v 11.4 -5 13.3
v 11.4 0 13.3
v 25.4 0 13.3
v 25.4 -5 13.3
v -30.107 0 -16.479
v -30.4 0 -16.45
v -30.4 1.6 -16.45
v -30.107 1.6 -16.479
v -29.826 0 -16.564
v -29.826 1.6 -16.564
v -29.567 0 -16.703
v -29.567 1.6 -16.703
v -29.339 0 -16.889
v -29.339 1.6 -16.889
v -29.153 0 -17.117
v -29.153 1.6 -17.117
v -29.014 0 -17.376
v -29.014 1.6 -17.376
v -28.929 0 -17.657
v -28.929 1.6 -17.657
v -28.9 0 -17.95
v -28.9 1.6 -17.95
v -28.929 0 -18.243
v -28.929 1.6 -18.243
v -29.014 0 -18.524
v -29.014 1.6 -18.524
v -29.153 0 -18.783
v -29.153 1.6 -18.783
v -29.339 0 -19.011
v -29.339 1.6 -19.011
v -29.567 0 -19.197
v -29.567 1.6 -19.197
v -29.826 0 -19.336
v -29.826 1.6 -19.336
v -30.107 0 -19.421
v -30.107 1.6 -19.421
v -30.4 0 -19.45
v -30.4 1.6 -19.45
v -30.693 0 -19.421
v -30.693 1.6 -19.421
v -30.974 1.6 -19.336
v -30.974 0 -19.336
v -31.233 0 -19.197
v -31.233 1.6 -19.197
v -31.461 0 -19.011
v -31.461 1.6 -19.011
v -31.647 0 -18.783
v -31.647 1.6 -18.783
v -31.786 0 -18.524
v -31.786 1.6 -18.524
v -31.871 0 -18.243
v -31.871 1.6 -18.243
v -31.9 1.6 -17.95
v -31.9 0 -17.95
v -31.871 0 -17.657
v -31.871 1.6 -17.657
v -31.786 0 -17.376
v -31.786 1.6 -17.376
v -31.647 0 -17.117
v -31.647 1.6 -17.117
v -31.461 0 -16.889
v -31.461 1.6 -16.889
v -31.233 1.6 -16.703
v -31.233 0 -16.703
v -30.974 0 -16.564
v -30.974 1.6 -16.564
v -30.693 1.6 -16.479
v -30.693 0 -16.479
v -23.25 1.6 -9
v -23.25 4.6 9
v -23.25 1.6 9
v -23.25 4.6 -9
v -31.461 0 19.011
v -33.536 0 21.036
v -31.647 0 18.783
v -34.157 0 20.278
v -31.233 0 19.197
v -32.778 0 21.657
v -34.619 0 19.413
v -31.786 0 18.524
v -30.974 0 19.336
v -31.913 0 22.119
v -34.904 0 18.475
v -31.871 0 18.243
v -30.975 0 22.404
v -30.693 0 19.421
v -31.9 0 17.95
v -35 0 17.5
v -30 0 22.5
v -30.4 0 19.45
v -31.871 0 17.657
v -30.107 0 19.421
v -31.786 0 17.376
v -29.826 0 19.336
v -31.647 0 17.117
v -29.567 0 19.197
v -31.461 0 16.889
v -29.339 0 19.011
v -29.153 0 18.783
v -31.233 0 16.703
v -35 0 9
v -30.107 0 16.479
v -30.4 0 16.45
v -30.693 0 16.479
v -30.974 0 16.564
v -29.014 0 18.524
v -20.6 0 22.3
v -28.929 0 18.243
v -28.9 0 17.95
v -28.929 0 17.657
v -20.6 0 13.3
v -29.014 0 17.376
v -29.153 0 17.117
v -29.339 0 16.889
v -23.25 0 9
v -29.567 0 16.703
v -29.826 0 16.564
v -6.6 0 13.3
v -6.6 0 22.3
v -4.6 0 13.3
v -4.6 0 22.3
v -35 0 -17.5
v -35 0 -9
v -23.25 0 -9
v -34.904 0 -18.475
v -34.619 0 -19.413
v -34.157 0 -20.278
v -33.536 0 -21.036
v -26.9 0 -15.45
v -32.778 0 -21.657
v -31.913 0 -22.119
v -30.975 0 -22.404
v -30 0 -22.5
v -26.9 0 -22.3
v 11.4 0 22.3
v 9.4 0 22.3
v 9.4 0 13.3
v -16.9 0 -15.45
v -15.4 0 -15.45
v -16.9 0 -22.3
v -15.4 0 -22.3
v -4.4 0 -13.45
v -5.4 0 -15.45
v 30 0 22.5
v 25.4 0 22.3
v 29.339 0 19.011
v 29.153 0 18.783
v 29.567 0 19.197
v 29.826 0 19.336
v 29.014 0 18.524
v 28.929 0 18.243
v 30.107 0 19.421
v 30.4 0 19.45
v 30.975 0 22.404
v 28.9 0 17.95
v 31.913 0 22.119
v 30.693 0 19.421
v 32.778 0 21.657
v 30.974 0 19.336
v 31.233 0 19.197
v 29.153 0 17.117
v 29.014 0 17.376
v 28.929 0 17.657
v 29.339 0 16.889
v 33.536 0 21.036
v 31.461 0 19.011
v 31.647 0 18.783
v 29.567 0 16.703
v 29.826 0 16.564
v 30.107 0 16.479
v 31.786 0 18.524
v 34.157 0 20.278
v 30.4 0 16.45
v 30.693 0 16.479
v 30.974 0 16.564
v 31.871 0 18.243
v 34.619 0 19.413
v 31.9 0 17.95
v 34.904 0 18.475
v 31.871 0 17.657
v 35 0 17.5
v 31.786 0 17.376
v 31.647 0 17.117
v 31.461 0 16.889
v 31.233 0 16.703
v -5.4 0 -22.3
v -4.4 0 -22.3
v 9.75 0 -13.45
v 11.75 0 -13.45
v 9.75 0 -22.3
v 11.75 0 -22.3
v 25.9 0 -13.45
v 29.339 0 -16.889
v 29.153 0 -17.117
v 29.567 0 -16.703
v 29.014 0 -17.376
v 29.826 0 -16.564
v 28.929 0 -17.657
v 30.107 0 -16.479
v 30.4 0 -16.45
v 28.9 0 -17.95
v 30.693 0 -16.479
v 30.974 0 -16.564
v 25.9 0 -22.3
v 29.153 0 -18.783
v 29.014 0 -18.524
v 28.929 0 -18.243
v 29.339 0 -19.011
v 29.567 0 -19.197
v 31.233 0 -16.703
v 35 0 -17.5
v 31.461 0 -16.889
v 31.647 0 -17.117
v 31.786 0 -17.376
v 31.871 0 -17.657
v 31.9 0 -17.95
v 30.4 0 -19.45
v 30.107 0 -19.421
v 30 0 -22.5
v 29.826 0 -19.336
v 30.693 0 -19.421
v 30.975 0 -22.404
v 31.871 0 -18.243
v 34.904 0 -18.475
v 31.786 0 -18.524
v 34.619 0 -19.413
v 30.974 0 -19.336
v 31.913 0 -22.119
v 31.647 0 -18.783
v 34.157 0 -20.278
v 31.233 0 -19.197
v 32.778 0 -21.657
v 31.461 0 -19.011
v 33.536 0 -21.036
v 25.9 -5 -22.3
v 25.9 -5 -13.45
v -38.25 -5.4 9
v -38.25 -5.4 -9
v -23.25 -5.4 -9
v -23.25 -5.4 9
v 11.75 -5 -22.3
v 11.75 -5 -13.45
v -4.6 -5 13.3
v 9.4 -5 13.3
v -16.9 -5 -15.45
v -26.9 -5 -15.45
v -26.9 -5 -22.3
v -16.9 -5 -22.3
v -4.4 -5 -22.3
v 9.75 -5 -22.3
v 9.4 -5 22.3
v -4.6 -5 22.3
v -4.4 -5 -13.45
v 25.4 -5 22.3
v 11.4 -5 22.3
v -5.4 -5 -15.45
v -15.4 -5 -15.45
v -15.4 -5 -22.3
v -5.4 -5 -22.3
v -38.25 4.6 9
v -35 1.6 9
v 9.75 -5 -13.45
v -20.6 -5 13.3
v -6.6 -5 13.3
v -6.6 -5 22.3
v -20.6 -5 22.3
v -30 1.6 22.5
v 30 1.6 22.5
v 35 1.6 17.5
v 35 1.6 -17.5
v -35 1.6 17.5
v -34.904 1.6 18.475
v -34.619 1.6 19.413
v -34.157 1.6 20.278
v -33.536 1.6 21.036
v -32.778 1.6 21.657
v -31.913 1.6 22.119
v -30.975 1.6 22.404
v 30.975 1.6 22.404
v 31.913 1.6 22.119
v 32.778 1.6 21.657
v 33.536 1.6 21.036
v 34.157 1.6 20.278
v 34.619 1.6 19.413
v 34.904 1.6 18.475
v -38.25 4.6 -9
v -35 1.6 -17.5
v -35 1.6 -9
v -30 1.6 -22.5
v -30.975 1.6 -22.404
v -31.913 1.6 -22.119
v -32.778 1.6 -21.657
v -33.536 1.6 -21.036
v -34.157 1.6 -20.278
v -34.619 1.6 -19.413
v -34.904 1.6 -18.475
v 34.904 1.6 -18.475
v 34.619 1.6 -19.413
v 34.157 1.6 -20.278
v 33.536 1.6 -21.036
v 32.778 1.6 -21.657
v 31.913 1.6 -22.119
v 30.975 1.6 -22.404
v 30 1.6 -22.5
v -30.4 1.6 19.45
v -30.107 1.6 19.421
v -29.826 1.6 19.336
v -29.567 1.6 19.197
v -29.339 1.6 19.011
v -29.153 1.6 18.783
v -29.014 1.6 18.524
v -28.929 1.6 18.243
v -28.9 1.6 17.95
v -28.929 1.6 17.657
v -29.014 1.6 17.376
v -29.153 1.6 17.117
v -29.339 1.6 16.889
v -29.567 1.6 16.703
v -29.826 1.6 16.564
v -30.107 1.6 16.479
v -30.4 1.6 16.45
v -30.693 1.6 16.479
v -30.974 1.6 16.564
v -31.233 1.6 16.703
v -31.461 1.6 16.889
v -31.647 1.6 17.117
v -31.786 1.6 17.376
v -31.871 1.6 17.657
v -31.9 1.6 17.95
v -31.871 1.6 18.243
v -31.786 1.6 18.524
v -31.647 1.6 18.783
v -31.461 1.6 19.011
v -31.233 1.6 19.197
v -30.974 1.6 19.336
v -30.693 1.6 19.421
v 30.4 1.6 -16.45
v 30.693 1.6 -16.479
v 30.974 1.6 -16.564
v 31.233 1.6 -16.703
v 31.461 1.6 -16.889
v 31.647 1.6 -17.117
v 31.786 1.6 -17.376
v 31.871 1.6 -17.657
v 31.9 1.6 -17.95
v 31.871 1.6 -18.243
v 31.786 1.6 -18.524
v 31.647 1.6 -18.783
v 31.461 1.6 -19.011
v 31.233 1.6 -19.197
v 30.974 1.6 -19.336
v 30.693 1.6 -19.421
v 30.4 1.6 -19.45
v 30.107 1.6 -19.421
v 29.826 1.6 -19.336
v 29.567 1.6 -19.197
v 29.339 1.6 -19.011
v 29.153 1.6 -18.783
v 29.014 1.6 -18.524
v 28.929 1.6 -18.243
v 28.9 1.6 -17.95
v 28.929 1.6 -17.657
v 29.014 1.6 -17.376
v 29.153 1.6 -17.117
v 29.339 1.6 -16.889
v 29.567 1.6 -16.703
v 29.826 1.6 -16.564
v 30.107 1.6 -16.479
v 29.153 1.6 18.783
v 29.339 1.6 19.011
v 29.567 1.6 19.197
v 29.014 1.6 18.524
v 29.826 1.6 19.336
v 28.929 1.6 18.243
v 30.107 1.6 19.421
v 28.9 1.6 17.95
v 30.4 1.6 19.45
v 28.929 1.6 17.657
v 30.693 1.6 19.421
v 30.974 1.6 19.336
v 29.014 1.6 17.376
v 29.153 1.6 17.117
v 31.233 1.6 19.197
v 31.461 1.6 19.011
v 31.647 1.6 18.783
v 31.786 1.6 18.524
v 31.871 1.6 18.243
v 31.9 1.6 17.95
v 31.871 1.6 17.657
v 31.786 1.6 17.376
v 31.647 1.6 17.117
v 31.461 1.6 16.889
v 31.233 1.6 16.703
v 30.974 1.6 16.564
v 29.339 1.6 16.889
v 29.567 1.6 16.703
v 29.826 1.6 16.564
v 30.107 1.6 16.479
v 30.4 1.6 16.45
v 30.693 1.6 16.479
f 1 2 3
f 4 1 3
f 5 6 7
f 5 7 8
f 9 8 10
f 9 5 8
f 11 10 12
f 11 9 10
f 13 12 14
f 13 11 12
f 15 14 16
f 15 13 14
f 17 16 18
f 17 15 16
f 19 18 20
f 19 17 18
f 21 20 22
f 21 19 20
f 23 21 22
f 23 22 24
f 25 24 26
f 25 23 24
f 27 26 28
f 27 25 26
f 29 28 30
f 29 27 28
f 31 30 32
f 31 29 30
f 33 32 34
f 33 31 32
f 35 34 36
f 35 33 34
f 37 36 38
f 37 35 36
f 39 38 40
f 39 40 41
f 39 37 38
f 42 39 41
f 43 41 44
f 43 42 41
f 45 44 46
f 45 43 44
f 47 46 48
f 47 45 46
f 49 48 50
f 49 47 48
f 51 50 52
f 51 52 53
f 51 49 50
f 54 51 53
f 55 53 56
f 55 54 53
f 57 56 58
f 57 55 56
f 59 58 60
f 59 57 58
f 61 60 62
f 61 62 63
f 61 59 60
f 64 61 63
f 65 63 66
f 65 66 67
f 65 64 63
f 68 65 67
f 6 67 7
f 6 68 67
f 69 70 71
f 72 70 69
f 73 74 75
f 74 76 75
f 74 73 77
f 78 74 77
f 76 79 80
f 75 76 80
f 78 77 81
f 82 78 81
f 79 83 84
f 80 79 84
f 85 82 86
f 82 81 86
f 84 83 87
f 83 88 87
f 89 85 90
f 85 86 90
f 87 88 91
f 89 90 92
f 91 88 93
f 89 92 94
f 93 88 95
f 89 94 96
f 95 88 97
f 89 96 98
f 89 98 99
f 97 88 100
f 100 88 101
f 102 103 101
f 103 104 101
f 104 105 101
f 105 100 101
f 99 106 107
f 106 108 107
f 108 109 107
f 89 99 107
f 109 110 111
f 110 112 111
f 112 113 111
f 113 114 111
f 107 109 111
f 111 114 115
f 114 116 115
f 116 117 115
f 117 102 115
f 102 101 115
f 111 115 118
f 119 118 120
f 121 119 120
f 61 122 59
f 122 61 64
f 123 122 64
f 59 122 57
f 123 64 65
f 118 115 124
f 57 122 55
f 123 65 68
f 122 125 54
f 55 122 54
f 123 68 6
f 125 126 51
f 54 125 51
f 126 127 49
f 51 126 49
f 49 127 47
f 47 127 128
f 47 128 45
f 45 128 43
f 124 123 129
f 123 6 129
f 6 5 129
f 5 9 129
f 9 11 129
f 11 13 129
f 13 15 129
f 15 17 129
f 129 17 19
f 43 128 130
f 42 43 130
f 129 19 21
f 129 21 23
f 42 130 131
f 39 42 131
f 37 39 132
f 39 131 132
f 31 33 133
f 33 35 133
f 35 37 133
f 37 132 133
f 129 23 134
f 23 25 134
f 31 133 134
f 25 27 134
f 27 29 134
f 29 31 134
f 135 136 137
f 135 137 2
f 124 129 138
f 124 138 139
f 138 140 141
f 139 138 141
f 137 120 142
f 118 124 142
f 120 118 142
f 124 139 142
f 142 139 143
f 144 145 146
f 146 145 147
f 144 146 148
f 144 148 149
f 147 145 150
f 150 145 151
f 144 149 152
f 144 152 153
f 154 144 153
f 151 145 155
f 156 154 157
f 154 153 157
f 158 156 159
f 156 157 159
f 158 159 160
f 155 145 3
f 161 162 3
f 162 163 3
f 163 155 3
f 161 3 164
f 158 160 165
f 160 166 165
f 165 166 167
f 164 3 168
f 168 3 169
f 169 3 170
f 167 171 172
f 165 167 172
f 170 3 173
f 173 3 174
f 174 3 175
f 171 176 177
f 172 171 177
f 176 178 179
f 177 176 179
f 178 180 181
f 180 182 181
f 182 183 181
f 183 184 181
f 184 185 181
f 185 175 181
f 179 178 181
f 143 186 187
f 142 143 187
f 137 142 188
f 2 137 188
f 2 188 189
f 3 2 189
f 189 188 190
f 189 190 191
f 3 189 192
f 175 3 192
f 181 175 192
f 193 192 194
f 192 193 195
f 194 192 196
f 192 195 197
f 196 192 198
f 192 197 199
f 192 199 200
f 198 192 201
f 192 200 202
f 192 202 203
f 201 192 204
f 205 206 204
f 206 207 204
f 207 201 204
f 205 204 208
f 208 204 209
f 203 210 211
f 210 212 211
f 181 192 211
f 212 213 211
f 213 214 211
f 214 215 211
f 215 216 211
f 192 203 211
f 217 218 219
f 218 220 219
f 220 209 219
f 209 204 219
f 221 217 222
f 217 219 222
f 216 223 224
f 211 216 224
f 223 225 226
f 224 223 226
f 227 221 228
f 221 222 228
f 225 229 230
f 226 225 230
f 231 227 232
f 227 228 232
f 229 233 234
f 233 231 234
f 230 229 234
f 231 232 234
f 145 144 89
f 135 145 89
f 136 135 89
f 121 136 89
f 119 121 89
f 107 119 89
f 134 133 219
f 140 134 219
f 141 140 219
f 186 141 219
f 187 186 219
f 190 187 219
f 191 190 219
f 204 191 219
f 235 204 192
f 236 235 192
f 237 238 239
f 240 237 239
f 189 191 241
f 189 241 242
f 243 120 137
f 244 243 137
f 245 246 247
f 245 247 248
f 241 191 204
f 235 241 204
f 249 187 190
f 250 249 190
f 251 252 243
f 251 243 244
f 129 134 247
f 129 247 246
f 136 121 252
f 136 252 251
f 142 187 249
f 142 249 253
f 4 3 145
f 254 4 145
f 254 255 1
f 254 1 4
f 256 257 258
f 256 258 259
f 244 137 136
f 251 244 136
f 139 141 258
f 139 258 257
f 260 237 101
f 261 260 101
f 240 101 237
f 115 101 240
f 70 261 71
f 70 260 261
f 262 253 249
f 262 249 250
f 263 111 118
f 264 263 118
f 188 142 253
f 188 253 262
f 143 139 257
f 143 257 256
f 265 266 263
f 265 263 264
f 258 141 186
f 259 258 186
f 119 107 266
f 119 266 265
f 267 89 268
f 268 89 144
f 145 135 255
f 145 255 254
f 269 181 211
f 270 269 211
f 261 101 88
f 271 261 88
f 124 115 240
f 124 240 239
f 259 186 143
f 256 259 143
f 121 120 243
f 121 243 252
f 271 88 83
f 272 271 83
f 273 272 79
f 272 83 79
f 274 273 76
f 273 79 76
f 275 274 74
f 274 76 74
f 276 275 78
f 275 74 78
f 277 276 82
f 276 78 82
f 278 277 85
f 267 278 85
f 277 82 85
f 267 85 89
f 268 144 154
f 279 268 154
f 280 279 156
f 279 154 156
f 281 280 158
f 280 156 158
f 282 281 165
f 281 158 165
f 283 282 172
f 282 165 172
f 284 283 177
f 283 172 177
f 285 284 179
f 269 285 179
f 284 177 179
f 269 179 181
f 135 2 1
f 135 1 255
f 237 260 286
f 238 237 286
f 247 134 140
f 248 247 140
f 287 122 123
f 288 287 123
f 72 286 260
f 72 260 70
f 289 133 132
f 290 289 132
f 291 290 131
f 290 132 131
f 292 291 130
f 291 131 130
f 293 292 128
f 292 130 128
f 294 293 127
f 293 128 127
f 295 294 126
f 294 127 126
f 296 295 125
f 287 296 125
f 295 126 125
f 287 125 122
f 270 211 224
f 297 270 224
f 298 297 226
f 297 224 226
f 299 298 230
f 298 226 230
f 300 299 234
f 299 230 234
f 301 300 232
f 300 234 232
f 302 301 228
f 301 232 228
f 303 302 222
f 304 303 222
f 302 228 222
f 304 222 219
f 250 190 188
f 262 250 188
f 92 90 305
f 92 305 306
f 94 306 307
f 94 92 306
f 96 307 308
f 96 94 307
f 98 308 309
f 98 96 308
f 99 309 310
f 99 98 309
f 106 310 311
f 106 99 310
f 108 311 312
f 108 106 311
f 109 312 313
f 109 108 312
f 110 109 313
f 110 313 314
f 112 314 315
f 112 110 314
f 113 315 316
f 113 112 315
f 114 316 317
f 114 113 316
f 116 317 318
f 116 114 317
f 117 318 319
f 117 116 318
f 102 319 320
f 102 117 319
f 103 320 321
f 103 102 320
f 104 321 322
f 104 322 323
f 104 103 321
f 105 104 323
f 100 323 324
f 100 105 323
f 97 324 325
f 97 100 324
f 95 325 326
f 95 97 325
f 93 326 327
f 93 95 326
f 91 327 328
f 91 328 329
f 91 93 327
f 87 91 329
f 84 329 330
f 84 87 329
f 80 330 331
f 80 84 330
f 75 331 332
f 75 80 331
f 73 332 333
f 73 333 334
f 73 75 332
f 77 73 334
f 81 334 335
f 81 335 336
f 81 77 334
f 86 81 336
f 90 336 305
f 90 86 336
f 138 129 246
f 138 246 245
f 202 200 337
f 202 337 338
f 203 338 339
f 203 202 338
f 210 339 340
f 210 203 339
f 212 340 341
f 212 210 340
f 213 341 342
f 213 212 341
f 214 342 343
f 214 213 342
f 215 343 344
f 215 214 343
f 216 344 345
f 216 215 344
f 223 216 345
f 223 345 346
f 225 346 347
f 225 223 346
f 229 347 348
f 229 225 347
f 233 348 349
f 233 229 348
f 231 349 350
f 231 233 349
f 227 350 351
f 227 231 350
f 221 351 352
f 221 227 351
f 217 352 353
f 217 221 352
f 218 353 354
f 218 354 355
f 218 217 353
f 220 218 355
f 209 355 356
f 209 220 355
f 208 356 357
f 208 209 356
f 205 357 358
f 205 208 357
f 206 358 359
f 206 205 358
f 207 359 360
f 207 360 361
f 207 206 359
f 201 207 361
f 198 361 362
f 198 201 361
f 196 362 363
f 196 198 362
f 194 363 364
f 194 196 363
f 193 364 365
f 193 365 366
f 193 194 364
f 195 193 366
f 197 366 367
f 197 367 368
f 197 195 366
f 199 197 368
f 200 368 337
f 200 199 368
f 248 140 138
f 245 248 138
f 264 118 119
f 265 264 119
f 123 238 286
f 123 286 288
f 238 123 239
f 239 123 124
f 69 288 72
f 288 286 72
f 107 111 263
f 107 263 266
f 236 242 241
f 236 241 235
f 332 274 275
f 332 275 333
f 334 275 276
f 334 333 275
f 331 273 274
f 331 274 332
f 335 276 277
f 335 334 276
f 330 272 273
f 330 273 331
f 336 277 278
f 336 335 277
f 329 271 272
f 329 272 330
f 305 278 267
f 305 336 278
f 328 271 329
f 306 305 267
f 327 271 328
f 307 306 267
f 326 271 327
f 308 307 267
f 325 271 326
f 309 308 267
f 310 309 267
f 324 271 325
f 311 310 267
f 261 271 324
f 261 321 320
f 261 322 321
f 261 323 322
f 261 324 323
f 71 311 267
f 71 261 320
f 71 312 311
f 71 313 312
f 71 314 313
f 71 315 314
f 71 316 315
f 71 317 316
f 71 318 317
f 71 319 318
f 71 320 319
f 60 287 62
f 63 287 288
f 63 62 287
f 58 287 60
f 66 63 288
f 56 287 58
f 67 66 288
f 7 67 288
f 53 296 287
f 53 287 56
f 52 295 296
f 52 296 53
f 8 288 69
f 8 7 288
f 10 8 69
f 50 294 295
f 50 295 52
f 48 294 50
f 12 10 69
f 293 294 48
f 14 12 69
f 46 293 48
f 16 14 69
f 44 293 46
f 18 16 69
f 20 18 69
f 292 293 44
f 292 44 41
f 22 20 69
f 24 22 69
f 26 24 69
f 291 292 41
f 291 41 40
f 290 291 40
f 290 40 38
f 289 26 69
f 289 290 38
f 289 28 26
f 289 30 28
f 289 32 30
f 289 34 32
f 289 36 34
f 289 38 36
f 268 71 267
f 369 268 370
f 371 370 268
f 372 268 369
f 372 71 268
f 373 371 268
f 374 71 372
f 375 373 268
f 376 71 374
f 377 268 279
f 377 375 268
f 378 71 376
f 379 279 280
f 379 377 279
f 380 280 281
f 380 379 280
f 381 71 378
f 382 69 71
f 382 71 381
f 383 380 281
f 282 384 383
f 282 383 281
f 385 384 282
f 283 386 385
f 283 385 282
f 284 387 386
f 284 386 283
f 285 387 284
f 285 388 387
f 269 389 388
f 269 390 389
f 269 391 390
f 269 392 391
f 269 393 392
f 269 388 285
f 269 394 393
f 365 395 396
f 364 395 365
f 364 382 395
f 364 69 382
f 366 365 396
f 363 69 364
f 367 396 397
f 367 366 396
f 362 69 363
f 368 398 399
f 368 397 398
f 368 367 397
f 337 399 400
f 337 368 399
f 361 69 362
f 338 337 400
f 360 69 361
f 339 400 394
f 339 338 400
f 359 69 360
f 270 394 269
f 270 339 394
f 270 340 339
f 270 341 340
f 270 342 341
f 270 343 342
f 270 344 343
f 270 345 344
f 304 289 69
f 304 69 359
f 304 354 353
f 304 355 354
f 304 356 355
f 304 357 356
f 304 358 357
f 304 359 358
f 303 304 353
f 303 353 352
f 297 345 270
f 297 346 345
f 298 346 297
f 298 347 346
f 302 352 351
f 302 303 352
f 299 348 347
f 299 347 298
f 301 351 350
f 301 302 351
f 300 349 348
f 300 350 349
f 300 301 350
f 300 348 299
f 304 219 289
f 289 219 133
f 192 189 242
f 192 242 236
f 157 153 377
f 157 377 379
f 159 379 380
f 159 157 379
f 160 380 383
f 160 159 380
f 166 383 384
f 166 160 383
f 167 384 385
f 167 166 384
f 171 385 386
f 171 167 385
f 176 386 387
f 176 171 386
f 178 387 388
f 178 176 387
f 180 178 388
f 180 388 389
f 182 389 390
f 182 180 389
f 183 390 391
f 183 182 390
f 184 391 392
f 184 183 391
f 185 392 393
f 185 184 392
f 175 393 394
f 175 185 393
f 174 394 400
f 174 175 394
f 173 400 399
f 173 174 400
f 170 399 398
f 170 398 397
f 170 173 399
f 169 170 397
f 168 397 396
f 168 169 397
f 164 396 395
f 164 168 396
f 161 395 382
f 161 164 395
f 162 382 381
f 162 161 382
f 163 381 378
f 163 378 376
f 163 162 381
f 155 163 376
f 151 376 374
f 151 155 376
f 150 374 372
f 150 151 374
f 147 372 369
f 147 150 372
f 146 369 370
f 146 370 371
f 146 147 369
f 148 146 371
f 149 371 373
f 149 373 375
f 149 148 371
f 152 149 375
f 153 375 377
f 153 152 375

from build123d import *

# Parameters (mm, degrees)
SKETCH_1_R      = 2.5
EXTRUDE_1_DEPTH = 1.6
SKETCH_2_W      = 15
SKETCH_2_H      = 18
EXTRUDE_2_DEPTH = 10
SKETCH_3_W      = 10
SKETCH_3_H      = 6.85
SKETCH_3_W_2    = 14.15
SKETCH_3_H_2    = 8.85
SKETCH_3_W_3    = 14
SKETCH_3_H_3    = 9
EXTRUDE_3_DEPTH = 5
SKETCH_1_3_R    = 2.5
SKETCH_1_3_R_2  = 1.5
EXTRUDE_4_DEPTH = 1.6


with BuildPart() as part:
    # 草图1 → 凸台-拉伸1 (new body)
    with BuildSketch(Plane(origin=(0, 0, 0), x_dir=(1, 0, 0), z_dir=(0, 1, 0))):
        with BuildLine():
            Line((30, 22.5), (-30, 22.5))
            ThreePointArc((-30, 22.5), (-33.535533906, 21.035533906), (-35, 17.5))
            Line((-35, 17.5), (-35, -17.5))
            ThreePointArc((-35, -17.5), (-33.535533906, -21.035533906), (-30, -22.5))
            Line((-30, -22.5), (30, -22.5))
            ThreePointArc((30, -22.5), (33.535533906, -21.035533906), (35, -17.5))
            Line((35, -17.5), (35, 17.5))
            ThreePointArc((35, 17.5), (33.535533906, 21.035533906), (30, 22.5))
        make_face()
        with Locations((-30.4, -17.95)):
            Circle(SKETCH_1_R, mode=Mode.SUBTRACT)
        with Locations((30.4, -17.95)):
            Circle(SKETCH_1_R, mode=Mode.SUBTRACT)
        with Locations((-30.4, 17.95)):
            Circle(SKETCH_1_R, mode=Mode.SUBTRACT)
        with Locations((30.4, 17.95)):
            Circle(SKETCH_1_R, mode=Mode.SUBTRACT)
    extrude(amount=EXTRUDE_1_DEPTH)

    # 草图2 → 凸台-拉伸2 (add)
    with BuildSketch(Plane(origin=(0, 4.6, 0), x_dir=(1, 0, 0), z_dir=(0, 1, 0))):
        with Locations((-30.75023032, 0)):
            Rectangle(SKETCH_2_W, SKETCH_2_H)
    extrude(amount=-EXTRUDE_2_DEPTH)

    # 草图3 → 凸台-拉伸3 (add)
    with BuildSketch(Plane.XZ):
        with Locations((-21.9, -18.875)):
            Rectangle(SKETCH_3_W, SKETCH_3_H)
        with Locations((-10.4, -18.875)):
            Rectangle(SKETCH_3_W, SKETCH_3_H)
        with Locations((2.675, -17.875)):
            Rectangle(SKETCH_3_W_2, SKETCH_3_H_2)
        with Locations((18.825, -17.875)):
            Rectangle(SKETCH_3_W_2, SKETCH_3_H_2)
        with Locations((-13.6, 17.8)):
            Rectangle(SKETCH_3_W_3, SKETCH_3_H_3)
        with Locations((2.4, 17.8)):
            Rectangle(SKETCH_3_W_3, SKETCH_3_H_3)
        with Locations((18.4, 17.8)):
            Rectangle(SKETCH_3_W_3, SKETCH_3_H_3)
    extrude(amount=EXTRUDE_3_DEPTH)

    # 草图1<3> → 凸台-拉伸4 (add)
    # profile 1 of 4: a face of its own
    with BuildSketch(Plane(origin=(0, 0, 0), x_dir=(1, 0, 0), z_dir=(0, 1, 0))):
        with Locations((-30.4, -17.95)):
            Circle(SKETCH_1_3_R)
        with Locations((-30.4, -17.95)):
            Circle(SKETCH_1_3_R_2, mode=Mode.SUBTRACT)
    # profile 2 of 4: a face of its own
    with BuildSketch(Plane(origin=(0, 0, 0), x_dir=(1, 0, 0), z_dir=(0, 1, 0))):
        with Locations((-30.4, 17.95)):
            Circle(SKETCH_1_3_R)
        with Locations((-30.4, 17.95)):
            Circle(SKETCH_1_3_R_2, mode=Mode.SUBTRACT)
    # profile 3 of 4: a face of its own
    with BuildSketch(Plane(origin=(0, 0, 0), x_dir=(1, 0, 0), z_dir=(0, 1, 0))):
        with Locations((30.4, 17.95)):
            Circle(SKETCH_1_3_R)
        with Locations((30.4, 17.95)):
            Circle(SKETCH_1_3_R_2, mode=Mode.SUBTRACT)
    # profile 4 of 4: a face of its own
    with BuildSketch(Plane(origin=(0, 0, 0), x_dir=(1, 0, 0), z_dir=(0, 1, 0))):
        with Locations((30.4, -17.95)):
            Circle(SKETCH_1_3_R)
        with Locations((30.4, -17.95)):
            Circle(SKETCH_1_3_R_2, mode=Mode.SUBTRACT)
    extrude(amount=EXTRUDE_4_DEPTH)


solid = part.part
